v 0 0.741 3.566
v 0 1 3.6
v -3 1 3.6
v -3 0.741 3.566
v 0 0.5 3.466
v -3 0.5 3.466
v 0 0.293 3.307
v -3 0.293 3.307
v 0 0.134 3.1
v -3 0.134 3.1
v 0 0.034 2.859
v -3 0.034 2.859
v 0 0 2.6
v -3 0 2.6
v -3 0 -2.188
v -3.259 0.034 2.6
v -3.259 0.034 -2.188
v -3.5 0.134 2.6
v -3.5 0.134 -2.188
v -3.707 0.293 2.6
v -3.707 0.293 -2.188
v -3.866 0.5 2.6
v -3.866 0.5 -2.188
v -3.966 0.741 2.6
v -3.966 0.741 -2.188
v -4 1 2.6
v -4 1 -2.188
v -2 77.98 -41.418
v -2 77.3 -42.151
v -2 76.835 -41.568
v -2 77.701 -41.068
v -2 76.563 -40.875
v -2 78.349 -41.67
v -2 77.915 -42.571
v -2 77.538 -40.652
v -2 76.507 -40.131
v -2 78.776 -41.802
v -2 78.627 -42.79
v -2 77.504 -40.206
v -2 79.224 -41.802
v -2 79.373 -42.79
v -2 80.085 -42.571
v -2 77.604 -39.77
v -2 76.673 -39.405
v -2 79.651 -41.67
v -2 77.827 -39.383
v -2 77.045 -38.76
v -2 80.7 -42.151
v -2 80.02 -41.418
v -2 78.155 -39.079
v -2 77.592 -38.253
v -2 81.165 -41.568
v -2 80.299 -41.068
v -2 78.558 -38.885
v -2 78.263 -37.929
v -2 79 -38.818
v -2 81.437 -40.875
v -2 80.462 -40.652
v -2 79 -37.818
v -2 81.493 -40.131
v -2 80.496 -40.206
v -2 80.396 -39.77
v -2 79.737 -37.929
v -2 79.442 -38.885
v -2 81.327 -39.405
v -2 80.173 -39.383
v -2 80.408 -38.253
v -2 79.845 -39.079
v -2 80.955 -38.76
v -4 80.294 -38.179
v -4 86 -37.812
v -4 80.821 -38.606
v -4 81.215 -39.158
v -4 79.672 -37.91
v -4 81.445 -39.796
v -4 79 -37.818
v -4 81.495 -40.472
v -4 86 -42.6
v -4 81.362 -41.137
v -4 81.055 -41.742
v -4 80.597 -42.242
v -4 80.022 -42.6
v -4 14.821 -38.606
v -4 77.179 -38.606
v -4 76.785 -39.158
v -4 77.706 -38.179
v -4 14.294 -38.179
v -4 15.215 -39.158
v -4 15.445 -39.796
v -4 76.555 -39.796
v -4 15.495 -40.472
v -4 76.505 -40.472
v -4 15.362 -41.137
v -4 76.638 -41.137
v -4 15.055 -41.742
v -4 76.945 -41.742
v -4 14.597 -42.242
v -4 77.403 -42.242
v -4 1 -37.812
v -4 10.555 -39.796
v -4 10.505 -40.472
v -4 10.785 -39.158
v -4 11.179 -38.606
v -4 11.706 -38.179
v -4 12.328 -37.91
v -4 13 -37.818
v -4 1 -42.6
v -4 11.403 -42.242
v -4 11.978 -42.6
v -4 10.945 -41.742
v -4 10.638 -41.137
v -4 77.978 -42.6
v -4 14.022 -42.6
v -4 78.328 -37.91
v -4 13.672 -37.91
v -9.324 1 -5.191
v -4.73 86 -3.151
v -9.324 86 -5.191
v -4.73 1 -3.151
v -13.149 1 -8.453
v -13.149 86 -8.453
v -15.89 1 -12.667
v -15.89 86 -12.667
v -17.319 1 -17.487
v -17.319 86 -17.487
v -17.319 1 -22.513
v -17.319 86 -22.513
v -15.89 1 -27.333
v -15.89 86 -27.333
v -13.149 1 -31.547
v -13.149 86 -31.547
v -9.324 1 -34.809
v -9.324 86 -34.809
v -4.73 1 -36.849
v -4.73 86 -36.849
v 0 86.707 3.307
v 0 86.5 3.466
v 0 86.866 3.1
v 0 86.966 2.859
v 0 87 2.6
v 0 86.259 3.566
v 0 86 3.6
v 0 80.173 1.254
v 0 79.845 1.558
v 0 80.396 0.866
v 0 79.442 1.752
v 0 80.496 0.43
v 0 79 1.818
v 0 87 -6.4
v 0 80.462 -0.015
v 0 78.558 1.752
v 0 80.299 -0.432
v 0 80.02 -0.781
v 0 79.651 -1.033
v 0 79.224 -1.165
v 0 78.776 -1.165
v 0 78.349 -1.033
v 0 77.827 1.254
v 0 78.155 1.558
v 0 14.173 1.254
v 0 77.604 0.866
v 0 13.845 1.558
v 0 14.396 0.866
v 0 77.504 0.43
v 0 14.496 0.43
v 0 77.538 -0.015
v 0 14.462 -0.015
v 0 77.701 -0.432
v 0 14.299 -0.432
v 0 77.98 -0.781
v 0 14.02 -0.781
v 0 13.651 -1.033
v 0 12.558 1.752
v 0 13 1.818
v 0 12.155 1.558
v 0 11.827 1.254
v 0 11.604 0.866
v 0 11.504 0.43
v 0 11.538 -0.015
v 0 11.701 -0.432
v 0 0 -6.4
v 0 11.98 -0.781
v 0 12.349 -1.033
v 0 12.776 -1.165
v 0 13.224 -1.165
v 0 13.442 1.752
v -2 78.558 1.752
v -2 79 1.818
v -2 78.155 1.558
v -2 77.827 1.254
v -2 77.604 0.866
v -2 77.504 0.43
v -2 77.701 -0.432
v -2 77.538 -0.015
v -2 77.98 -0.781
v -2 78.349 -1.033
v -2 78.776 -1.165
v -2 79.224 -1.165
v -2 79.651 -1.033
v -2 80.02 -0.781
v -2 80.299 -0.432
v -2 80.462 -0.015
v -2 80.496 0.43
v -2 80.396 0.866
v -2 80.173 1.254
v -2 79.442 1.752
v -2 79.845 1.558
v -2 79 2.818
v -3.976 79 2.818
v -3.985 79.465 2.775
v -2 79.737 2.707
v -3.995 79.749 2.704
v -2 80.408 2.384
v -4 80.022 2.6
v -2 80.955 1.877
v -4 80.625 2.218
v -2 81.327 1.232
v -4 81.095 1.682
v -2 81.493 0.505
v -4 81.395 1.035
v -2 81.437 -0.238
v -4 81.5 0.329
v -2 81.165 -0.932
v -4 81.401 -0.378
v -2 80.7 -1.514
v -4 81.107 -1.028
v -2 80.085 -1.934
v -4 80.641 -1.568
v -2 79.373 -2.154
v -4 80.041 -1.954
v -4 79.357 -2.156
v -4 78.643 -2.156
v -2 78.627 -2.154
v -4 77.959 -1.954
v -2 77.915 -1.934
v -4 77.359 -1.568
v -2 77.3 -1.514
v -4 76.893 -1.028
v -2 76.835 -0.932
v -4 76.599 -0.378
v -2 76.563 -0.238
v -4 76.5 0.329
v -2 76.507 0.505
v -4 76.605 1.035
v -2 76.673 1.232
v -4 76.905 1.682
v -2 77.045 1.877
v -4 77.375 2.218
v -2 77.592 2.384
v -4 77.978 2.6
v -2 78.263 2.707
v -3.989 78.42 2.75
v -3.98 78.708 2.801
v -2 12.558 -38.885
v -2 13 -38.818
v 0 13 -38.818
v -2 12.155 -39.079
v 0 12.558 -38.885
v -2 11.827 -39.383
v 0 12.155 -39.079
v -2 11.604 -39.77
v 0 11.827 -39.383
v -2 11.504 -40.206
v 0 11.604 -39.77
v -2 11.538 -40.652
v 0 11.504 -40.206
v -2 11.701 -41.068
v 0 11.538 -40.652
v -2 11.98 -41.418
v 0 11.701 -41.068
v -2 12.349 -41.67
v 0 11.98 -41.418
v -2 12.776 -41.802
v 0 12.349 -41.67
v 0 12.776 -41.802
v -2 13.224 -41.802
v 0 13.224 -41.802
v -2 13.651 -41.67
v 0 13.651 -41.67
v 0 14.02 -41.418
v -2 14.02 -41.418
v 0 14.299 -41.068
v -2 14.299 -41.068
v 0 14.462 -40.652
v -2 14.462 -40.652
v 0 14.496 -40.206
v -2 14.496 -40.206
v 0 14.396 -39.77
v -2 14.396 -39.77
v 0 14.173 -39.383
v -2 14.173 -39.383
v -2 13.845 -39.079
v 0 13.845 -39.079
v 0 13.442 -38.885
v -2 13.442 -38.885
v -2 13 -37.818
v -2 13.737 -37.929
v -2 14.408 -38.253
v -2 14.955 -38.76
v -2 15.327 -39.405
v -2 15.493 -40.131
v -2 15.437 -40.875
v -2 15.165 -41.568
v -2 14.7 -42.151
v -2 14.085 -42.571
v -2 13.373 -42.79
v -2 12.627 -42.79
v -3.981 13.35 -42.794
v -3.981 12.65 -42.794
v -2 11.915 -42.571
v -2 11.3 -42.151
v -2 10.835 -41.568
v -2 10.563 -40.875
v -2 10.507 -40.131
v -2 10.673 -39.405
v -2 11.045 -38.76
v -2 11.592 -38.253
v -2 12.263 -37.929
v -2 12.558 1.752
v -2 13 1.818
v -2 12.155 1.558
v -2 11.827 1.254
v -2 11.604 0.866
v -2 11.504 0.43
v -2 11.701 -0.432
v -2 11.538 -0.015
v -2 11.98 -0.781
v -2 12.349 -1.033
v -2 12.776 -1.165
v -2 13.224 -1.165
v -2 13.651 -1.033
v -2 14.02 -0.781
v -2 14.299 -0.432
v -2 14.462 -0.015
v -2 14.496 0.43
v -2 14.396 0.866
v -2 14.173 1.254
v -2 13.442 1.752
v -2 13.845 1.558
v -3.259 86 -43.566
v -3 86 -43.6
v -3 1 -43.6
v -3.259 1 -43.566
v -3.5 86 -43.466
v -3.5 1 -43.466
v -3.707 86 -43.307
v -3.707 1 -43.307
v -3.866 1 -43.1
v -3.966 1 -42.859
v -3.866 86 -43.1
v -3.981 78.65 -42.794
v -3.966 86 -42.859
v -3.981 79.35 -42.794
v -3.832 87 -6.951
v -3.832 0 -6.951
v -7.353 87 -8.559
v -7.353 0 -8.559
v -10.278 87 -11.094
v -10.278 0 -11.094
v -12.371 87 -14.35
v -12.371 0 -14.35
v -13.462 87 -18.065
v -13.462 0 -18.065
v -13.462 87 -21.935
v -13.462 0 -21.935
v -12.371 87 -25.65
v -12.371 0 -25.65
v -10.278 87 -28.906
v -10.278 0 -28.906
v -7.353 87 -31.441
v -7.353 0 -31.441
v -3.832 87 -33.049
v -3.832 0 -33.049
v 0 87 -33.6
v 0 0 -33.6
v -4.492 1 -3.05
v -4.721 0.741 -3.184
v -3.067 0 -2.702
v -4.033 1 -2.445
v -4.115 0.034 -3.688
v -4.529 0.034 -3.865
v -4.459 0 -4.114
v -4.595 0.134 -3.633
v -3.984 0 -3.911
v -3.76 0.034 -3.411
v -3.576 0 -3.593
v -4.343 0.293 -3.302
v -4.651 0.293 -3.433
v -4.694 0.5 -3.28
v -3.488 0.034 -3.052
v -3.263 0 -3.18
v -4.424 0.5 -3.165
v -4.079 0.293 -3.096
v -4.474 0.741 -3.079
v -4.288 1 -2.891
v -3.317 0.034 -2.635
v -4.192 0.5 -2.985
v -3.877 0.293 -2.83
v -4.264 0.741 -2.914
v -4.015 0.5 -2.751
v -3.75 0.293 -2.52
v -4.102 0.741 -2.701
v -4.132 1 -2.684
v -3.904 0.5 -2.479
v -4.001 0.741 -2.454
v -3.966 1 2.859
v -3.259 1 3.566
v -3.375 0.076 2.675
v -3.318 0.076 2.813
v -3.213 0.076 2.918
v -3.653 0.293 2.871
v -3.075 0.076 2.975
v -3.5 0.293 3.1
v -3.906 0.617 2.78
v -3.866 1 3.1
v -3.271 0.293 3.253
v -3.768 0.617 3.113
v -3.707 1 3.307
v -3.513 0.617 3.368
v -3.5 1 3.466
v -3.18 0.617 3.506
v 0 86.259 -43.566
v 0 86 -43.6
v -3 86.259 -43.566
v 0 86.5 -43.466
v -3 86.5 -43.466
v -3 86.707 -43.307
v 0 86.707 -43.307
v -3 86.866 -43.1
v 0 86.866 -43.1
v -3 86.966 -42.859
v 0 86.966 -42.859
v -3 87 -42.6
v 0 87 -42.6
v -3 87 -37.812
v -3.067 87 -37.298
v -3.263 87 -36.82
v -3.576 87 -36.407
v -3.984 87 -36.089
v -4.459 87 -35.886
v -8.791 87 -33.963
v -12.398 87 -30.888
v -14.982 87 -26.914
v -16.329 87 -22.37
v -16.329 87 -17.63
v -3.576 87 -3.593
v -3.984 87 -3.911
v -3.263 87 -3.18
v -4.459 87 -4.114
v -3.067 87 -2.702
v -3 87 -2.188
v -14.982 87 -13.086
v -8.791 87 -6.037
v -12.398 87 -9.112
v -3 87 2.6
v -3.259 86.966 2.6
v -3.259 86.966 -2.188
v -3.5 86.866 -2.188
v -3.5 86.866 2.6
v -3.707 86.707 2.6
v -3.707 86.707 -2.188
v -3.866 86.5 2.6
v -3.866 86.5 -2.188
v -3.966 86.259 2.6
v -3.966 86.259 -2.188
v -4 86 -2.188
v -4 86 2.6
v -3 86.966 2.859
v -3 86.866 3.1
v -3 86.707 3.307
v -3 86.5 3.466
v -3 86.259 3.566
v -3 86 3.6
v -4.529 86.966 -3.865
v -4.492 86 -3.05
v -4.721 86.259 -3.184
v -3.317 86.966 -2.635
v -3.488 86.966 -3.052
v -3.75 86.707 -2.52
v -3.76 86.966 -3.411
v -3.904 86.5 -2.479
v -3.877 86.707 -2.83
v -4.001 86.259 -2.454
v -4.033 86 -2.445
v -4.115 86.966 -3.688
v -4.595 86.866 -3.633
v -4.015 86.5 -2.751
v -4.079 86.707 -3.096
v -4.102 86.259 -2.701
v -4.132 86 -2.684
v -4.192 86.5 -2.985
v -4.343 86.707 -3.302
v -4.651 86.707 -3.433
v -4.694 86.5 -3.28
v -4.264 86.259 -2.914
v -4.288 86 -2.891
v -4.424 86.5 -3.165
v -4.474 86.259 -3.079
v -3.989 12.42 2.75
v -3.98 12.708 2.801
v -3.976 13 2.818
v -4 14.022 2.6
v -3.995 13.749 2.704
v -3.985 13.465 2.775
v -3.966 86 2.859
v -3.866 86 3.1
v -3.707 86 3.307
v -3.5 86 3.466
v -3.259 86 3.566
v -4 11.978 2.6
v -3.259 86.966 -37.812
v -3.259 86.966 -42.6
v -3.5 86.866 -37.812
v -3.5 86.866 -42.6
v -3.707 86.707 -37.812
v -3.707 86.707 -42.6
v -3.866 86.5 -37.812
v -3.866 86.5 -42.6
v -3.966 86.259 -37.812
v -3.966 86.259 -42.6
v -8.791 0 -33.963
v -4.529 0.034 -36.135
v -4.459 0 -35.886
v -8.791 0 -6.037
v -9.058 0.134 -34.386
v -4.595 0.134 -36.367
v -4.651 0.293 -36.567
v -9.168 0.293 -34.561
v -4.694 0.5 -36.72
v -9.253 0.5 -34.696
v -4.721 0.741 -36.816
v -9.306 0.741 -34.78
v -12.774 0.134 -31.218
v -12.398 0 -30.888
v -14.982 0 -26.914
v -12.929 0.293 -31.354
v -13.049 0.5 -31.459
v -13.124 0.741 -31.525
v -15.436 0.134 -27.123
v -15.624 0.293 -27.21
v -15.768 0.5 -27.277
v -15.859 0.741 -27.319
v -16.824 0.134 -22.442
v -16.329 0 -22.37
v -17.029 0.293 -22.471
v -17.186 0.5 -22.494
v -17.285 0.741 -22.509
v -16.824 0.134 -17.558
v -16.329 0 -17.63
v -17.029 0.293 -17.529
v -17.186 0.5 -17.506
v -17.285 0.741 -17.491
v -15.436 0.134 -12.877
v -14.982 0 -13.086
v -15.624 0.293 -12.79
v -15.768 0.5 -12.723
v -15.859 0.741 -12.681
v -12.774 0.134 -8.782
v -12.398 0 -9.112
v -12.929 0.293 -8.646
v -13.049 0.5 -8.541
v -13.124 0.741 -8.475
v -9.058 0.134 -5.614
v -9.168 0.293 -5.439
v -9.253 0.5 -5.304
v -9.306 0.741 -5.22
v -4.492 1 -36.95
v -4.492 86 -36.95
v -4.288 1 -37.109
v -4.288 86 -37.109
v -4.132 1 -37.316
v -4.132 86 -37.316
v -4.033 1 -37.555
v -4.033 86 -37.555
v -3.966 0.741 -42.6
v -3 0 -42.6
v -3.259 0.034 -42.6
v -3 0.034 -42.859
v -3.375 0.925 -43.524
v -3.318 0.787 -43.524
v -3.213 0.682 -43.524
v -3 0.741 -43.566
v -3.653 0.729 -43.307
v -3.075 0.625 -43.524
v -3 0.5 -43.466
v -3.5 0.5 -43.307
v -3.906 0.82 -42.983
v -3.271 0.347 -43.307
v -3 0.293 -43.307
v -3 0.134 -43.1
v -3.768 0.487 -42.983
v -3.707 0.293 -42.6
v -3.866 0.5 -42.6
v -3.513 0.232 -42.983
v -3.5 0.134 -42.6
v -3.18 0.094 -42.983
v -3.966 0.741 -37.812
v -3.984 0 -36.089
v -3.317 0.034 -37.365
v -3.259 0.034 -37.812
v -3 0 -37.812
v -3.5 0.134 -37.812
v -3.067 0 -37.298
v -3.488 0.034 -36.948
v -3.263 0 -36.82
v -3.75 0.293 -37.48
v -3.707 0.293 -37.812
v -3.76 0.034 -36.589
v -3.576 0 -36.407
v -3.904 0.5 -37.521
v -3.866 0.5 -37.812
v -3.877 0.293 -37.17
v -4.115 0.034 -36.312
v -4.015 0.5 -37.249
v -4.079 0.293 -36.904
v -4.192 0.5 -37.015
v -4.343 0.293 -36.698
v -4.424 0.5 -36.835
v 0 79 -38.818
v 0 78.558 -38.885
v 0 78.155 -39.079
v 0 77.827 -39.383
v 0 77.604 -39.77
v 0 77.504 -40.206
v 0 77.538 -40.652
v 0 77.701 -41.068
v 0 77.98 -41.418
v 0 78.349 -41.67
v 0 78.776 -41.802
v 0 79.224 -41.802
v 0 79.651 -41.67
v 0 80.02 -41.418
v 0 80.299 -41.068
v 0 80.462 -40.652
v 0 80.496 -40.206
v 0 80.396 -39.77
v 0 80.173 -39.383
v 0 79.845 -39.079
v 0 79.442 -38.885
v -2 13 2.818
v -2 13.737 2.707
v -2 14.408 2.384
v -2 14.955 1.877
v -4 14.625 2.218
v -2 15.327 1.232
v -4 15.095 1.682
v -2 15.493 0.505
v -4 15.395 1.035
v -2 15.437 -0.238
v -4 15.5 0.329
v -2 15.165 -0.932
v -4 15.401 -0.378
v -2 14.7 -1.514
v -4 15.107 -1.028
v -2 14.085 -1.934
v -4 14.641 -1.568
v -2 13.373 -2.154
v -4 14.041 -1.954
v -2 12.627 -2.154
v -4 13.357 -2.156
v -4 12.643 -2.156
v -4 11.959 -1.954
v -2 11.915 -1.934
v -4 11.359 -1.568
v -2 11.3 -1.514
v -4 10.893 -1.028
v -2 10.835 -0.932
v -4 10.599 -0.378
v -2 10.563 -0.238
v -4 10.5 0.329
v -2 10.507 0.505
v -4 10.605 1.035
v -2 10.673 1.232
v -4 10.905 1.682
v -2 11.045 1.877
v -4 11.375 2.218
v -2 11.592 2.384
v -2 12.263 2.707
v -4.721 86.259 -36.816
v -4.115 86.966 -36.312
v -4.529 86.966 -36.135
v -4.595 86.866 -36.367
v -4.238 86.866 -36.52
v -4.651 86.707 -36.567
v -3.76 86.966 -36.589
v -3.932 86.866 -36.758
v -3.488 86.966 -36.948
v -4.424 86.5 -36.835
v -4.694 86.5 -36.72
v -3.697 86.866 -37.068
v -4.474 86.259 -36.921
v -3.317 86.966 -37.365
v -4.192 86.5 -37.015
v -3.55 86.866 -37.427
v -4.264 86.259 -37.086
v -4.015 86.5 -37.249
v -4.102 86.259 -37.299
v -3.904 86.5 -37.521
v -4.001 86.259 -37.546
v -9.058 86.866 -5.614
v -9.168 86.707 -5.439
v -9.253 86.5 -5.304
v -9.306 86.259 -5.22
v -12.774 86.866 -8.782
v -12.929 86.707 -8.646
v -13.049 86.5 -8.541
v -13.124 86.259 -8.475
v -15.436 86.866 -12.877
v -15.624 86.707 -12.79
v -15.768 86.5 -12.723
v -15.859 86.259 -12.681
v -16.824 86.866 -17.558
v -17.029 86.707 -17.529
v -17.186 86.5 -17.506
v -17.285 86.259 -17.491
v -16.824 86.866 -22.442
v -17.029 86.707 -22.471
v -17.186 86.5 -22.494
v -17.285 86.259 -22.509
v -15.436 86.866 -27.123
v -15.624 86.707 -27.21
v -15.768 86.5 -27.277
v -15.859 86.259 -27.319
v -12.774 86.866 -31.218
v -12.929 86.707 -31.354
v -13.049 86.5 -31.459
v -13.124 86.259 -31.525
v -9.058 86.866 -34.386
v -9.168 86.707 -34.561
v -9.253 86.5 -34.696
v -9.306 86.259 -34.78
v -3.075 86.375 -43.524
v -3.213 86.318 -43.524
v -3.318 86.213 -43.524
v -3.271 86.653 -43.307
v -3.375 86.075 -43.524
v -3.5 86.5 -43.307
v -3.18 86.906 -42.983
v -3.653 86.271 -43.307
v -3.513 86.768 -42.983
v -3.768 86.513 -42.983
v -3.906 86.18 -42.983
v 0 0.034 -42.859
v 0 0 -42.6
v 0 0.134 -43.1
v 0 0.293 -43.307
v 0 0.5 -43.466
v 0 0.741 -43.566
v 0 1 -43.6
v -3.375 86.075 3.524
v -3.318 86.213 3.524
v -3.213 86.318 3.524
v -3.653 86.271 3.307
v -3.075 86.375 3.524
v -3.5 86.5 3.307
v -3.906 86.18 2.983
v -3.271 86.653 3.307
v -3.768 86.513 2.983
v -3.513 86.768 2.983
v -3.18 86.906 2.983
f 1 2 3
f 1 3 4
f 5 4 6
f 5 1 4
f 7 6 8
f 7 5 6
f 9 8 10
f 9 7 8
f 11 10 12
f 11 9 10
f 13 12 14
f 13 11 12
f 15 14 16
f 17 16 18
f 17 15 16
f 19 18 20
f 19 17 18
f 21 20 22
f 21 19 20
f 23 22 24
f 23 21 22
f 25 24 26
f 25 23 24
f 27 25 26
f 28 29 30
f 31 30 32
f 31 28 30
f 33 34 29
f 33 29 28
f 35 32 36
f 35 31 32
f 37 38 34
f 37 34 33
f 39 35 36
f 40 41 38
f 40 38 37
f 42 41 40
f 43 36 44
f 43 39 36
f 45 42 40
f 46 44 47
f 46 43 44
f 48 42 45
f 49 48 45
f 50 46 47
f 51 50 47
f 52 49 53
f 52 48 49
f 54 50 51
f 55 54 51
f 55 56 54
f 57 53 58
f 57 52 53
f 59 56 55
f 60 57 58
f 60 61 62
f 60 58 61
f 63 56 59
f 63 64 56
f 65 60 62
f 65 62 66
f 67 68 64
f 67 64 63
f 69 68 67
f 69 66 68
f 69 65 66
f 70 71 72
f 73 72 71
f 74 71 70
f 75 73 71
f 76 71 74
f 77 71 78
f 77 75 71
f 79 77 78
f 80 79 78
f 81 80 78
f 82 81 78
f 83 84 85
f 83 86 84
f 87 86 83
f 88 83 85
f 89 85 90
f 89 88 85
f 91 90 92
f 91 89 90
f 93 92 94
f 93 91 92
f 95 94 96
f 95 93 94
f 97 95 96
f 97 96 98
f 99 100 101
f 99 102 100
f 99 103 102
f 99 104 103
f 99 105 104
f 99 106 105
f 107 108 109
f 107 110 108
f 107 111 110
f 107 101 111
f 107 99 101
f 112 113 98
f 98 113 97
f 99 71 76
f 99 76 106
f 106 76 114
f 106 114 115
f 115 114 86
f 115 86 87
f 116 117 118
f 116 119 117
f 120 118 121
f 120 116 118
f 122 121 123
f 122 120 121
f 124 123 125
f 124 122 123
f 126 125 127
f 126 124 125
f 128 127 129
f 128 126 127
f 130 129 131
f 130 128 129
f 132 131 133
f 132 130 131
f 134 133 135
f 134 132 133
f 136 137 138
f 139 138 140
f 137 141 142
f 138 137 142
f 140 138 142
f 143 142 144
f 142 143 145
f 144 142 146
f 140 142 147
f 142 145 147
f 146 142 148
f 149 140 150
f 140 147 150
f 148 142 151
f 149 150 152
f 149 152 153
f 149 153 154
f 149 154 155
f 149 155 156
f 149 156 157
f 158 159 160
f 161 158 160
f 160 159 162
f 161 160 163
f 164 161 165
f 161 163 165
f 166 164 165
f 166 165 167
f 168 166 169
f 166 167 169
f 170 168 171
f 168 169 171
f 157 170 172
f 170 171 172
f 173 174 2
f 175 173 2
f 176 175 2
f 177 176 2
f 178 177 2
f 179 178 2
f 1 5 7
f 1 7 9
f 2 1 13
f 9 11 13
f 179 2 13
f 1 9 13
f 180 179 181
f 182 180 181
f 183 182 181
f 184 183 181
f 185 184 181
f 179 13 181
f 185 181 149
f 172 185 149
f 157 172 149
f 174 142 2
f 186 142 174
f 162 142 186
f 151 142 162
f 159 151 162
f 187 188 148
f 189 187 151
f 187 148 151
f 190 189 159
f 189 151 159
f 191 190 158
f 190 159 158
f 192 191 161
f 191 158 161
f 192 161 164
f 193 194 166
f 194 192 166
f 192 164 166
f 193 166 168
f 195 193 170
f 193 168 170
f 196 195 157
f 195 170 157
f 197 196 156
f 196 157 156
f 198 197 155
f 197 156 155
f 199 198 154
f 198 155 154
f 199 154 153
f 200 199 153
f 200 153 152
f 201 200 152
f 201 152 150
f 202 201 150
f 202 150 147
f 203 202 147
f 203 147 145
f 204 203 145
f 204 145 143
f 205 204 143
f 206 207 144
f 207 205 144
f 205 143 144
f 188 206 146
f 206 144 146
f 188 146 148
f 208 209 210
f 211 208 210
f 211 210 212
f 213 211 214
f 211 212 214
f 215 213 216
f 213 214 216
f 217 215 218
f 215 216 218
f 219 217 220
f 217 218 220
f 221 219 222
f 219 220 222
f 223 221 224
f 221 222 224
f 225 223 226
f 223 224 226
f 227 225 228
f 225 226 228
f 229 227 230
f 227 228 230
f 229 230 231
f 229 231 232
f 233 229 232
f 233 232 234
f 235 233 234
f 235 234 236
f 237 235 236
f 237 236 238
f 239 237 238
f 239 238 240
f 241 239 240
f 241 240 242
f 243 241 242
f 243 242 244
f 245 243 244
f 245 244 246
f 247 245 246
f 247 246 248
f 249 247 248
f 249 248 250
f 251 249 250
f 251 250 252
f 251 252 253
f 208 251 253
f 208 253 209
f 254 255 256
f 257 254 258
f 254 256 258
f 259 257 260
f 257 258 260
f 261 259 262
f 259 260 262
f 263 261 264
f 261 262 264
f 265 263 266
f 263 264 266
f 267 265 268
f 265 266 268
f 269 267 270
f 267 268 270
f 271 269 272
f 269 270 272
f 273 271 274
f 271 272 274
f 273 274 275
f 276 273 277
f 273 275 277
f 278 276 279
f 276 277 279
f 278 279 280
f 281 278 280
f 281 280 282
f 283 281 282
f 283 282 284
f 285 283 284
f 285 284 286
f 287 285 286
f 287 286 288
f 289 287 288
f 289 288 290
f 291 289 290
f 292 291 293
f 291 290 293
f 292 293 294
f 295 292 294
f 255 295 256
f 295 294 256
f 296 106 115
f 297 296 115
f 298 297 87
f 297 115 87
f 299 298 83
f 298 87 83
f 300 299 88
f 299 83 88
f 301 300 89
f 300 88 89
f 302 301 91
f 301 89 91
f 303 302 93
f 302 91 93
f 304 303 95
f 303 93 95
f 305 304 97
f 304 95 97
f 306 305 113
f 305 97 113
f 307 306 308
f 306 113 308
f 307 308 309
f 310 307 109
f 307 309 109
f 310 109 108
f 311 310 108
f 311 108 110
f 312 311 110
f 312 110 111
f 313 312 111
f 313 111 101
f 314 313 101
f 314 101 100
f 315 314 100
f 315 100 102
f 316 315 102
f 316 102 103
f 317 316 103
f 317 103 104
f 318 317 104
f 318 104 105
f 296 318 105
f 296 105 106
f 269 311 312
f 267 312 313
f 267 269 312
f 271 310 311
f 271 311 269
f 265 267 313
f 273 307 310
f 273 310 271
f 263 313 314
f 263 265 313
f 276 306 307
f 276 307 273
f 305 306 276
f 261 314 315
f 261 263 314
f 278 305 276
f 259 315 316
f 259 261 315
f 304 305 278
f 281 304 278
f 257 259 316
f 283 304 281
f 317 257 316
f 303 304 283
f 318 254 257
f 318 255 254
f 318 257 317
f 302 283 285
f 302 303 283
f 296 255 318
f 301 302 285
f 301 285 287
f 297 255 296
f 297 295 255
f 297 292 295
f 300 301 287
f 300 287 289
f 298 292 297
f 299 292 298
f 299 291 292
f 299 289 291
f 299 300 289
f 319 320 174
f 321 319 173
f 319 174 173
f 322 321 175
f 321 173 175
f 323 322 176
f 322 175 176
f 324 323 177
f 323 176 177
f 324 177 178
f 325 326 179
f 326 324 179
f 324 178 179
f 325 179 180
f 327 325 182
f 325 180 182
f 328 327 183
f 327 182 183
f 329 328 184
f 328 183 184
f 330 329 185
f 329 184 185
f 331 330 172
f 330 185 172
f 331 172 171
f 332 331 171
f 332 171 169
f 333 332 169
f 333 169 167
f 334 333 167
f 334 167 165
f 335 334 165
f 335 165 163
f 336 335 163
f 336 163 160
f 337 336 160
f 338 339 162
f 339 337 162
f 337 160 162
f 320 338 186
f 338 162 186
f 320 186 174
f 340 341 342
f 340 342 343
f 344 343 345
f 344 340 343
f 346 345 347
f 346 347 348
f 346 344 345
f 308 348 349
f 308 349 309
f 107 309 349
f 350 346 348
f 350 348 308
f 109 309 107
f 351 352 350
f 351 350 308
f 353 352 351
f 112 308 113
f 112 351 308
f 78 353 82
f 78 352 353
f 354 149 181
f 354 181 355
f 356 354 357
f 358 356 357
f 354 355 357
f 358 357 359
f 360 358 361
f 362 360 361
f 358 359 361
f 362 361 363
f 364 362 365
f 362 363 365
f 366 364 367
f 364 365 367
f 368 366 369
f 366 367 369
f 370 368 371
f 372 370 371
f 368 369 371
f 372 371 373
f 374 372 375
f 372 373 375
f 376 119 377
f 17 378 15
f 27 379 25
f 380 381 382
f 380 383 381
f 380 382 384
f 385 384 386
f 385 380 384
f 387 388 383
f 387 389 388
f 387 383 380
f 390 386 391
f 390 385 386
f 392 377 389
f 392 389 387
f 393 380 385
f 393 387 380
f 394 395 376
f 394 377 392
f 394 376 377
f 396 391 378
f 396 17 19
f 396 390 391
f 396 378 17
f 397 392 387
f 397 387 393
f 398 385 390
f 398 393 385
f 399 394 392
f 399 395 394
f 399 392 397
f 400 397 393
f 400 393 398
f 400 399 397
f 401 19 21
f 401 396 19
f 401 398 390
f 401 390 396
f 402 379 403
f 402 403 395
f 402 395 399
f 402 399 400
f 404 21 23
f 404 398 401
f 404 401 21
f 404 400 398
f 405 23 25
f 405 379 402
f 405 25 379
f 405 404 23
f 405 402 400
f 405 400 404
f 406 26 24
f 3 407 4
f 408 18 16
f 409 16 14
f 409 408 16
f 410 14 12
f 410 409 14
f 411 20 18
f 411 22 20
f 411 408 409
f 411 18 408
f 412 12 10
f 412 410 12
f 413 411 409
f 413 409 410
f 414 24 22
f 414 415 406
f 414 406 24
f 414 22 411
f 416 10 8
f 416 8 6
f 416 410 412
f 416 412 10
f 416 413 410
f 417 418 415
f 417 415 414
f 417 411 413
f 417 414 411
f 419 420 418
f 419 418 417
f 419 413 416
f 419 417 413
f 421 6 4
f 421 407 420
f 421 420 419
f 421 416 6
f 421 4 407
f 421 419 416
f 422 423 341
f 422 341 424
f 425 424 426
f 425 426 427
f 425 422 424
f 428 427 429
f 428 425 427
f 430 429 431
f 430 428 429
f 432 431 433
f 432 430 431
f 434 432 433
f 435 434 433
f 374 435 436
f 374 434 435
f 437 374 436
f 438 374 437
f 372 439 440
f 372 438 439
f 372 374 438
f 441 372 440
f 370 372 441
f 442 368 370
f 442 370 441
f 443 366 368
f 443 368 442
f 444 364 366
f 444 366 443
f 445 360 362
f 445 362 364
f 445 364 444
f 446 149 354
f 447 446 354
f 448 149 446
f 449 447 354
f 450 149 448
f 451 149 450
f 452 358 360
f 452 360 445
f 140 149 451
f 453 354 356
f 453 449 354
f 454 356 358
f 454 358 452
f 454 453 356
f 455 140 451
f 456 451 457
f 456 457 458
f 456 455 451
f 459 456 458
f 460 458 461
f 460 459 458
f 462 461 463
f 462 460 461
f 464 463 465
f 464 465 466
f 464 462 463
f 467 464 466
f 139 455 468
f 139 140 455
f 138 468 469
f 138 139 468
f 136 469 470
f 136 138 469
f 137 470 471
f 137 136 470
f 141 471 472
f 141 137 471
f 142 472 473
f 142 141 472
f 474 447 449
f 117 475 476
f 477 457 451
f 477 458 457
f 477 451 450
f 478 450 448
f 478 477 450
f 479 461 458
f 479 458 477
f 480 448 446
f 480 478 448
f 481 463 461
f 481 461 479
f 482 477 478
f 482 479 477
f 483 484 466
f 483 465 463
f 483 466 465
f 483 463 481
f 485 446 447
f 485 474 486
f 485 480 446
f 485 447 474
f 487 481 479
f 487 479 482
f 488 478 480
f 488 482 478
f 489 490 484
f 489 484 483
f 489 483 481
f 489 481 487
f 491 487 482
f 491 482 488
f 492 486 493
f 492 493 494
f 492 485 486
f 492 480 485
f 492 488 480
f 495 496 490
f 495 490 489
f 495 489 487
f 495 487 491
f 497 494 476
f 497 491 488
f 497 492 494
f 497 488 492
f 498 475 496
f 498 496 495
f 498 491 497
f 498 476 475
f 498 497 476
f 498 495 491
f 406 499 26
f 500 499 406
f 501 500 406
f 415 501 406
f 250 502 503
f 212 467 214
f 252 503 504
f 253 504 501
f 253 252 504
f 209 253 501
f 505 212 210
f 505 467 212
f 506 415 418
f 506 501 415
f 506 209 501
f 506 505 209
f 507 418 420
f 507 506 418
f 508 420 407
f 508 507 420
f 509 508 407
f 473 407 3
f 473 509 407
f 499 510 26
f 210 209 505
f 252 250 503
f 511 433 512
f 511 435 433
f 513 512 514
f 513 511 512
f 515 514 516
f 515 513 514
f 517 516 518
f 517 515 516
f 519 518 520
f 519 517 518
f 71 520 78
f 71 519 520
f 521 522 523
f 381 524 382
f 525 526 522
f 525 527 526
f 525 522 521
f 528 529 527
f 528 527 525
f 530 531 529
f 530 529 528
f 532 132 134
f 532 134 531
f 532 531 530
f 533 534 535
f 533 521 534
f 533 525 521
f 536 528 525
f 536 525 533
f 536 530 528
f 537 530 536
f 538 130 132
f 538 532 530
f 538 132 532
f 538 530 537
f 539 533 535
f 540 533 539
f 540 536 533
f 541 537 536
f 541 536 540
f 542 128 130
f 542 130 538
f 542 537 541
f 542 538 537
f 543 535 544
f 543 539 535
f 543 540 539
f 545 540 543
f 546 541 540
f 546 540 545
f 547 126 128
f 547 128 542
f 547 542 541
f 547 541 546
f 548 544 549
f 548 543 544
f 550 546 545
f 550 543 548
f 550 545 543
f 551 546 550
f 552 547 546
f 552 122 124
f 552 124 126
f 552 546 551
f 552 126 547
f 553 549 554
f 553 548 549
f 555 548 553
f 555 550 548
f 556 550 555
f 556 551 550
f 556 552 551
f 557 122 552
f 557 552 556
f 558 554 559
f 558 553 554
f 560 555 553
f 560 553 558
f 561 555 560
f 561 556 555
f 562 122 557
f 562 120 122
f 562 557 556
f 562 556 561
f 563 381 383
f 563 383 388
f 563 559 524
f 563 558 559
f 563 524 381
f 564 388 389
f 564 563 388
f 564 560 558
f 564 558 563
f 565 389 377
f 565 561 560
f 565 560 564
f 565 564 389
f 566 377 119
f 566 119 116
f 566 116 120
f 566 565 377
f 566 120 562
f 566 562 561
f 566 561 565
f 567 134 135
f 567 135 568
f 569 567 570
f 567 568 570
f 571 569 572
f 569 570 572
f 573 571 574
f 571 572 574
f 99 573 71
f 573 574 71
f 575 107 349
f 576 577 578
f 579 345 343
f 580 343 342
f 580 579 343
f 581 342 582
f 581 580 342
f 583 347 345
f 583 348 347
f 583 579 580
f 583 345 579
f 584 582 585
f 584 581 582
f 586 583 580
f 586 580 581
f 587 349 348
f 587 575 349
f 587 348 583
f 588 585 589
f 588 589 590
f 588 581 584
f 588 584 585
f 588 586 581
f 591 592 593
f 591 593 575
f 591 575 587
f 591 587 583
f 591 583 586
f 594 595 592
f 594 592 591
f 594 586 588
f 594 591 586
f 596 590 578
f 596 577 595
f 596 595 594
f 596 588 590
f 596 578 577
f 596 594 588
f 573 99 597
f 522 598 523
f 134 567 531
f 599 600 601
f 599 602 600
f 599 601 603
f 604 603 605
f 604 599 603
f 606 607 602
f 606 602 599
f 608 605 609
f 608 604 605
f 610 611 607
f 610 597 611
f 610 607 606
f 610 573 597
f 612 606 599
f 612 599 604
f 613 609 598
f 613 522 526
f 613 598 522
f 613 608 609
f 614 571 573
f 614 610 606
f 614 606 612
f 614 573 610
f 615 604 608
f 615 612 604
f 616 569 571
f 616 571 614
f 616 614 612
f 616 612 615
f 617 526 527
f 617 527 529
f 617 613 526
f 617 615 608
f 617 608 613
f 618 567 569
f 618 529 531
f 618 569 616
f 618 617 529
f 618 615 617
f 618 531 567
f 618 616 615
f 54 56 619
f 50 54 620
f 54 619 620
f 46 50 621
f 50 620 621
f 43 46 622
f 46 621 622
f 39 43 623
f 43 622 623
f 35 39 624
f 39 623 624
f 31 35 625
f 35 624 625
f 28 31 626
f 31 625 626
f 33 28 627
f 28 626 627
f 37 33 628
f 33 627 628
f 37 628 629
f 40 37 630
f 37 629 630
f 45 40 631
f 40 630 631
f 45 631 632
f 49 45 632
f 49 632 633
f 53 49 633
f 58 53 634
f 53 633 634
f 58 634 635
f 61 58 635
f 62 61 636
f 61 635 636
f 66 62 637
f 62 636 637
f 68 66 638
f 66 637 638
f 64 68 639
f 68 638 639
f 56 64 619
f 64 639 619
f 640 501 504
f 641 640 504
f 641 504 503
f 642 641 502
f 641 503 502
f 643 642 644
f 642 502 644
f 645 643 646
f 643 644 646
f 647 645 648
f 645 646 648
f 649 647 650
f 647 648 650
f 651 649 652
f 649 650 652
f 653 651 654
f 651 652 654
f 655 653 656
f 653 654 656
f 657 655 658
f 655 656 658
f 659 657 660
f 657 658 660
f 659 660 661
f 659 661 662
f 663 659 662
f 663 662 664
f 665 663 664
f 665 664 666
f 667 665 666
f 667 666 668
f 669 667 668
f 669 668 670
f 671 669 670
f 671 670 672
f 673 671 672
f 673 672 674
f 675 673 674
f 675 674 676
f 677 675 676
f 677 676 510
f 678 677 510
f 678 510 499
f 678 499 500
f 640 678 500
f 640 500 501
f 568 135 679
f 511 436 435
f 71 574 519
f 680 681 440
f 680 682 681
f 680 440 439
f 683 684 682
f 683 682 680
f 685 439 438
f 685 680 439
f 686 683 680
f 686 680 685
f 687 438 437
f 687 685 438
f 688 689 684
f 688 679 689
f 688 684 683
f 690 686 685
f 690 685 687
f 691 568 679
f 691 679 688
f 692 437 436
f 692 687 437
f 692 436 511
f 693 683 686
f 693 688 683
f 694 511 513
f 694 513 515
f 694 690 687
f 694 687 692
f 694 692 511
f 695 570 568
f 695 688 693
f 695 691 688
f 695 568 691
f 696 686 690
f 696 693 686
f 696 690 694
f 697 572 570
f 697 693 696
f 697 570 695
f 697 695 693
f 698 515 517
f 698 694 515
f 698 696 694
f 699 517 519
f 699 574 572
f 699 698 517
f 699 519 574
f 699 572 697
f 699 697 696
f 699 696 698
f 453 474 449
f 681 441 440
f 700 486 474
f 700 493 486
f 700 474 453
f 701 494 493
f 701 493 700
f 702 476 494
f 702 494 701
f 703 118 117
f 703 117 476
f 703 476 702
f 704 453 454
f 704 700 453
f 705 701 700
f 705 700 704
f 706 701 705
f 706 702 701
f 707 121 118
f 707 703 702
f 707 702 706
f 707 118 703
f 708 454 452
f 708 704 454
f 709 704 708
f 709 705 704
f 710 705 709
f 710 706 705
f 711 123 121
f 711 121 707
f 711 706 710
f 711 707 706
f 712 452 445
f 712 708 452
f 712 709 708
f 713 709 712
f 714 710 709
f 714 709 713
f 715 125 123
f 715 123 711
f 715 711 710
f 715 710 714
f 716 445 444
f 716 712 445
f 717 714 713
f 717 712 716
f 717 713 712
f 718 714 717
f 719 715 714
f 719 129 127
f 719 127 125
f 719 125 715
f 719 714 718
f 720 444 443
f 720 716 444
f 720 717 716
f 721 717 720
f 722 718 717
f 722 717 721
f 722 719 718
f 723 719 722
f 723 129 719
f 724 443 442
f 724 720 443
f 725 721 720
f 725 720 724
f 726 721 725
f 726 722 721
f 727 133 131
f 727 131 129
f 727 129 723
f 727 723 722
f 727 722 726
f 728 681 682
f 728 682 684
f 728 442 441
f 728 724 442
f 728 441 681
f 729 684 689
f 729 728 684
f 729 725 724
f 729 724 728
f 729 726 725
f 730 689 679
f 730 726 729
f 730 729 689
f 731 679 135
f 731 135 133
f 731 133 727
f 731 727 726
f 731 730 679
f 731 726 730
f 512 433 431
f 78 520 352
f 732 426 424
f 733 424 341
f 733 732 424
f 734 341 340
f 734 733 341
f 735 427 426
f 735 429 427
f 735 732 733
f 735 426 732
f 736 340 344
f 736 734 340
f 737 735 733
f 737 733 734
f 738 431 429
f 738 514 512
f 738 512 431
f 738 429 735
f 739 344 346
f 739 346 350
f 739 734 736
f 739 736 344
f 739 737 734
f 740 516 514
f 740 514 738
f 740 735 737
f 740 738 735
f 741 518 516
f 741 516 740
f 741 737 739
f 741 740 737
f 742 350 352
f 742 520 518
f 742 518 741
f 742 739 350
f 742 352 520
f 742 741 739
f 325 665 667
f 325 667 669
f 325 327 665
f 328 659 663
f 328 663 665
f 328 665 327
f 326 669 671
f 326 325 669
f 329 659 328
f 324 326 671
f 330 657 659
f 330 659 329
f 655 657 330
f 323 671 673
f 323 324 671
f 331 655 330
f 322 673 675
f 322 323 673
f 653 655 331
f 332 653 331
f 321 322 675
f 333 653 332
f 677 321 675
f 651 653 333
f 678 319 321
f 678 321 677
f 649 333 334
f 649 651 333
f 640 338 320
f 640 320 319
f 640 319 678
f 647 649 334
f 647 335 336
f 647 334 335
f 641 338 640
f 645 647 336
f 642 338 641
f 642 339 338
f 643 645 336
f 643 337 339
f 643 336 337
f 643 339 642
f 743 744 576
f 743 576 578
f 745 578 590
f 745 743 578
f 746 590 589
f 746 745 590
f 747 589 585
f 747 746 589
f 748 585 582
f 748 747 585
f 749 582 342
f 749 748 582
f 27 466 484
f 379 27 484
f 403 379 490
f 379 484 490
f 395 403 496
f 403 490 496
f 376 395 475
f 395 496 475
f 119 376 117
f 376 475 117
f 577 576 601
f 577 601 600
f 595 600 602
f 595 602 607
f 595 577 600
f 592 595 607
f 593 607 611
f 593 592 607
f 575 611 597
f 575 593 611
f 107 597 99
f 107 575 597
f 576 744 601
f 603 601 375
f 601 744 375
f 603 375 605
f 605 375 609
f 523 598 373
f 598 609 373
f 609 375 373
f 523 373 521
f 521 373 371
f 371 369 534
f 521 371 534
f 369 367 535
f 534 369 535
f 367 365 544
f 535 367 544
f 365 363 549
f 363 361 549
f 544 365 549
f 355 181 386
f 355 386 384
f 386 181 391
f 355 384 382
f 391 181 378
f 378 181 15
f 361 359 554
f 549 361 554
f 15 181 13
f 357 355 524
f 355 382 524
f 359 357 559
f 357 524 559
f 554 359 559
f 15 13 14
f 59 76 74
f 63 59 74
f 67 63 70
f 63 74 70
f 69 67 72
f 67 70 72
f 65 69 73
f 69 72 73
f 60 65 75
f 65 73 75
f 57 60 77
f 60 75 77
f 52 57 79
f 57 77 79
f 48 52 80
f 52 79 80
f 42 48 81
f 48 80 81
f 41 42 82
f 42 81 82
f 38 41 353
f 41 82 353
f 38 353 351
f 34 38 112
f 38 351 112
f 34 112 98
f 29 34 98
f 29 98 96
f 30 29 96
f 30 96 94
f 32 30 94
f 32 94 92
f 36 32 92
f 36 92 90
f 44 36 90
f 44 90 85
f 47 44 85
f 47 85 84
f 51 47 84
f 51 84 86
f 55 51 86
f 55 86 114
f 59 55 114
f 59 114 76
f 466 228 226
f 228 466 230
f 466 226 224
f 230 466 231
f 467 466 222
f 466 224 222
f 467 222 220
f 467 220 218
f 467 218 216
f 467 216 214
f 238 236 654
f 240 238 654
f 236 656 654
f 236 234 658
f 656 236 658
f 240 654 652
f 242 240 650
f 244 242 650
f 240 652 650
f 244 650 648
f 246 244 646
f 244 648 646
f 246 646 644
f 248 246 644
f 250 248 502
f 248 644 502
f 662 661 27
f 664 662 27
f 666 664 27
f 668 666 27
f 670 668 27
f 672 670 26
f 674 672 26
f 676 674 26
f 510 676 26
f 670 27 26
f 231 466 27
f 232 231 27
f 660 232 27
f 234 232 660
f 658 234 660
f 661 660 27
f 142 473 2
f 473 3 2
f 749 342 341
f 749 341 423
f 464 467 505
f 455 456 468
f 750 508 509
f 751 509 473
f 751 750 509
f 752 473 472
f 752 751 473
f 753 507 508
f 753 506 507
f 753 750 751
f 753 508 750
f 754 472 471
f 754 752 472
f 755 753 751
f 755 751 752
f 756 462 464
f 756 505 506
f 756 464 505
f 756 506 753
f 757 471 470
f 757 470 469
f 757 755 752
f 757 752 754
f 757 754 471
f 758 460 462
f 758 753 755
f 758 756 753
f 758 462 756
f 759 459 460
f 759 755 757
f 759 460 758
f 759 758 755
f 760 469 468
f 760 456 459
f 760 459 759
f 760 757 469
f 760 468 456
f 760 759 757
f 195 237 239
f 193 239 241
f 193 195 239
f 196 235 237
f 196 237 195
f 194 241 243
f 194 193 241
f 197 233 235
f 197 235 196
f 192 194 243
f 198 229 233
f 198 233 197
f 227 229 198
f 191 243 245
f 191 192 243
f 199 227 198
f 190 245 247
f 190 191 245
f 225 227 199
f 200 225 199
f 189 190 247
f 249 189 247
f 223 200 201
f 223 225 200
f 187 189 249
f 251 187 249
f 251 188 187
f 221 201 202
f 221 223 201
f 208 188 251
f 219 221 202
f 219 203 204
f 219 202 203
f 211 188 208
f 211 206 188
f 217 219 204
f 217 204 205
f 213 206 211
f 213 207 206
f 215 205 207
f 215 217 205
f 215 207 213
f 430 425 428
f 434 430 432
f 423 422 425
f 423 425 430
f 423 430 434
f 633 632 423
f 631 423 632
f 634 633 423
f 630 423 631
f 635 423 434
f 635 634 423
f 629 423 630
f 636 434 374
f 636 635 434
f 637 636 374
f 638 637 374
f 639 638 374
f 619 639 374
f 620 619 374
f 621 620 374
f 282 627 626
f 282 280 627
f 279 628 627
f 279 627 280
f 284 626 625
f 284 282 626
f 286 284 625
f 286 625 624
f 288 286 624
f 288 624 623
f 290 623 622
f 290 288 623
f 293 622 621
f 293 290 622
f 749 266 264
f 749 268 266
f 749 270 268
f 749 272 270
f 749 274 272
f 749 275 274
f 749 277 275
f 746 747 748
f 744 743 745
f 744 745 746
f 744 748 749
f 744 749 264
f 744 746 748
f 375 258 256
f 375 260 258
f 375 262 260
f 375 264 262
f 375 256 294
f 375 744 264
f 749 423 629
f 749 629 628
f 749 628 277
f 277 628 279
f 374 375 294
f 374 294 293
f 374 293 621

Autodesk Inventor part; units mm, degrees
ref_plane "YZ Plane" through (0, 0, 0) normal (1, 0, 0) x (0, 1, 0)
ref_plane "XZ Plane" through (0, 0, 0) normal (0, 1, 0) x (-1, 0, 0)
ref_plane "XY Plane" through (0, 0, 0) normal (0, 0, 1) x (1, 0, 0)
sketch "スケッチ1" plane through (0, 0, 0) normal (0, 1, 0) x (-1, 0, 0)
  line L0 (0, 0) -> (20, 0)
  line L1 (20, 0) -> (20, -40)
  line L2 (20, -40) -> (0, -40)
  line L3 (0, -40) -> (0, 0)
  circle A0 centre (0, -20) radius 13.6
  circle A1 centre (0, -20) radius 17.5
  line L4 (0, -6.4) -> (4, -6.4)
  line L5 (4, -6.4) -> (4, 3.6)
  line L6 (4, 3.6) -> (0, 3.6)
  line L7 (0, 3.6) -> (0, -6.4)
  line L8 (0, -33.6) -> (4, -33.6)
  line L9 (4, -33.6) -> (4, -43.6)
  line L10 (4, -43.6) -> (0, -43.6)
  line L11 (0, -43.6) -> (0, -33.6)
  point P0 (0, -6.4)
  point P1 (0, -33.6)
  point P2 (4, -37.0367)
  point P3 (4, -2.9633)
  dimension "d0" = 20
  dimension "d1" = 40
  dimension "d2" = 27.2
  dimension "d3" = 35
  dimension "d4" = 4
  dimension "d5" = 10
  dimension "d6" = 4
  dimension "d7" = 10
extrude "押し出し1" add sketch "スケッチ1" along normal blind 87 contours L7 L6 L5 L0 | L0 L5 A1 L3 | A1 L5 L4 L3 | A1 L9 L8 A0 L4 L5 | A1 L9 L2 L3 | L3 L8 L9 A1 | L2 L9 L10 L11
sketch "スケッチ2" plane through (-4, 0, -43.6) normal (-1, 0, 0) x (0, 0, 1)
  line L0 (0, 87) -> (6.5633, 87) projected
  line L1 (40.6367, 87) -> (47.2, 87) projected
  line L2 (40.6367, 0) -> (47.2, 0) projected
  line L3 (0, 0) -> (6.5633, 0) projected
  point P0 (43.6, 0)
  point P1 (3.2816, 13)
  point P2 (3.2816, 79)
  point P3 (43.9184, 79)
  point P4 (43.9184, 13)
  point P5 (3.2816, 87)
  point P6 (43.9184, 87)
  point P7 (43.9184, 0)
  point P8 (3.2816, 0)
  dimension "d10" = 0
  dimension "d11" = 8
  dimension "d12" = 0
  dimension "d13" = 8
  dimension "d14" = 0
  dimension "d15" = 0
  dimension "d16" = 13
  dimension "d17" = 13
hole "穴1" at (-4, 13, -40.3184) at (-4, 79, -40.3184) at (-4, 79, 0.3184) at (-4, 13, 0.3184) direction (1, 0, 0) diameter 3 end through all
fillet "フィレット1" radius 1 14 edges at (-4, 87, 0.3184) (-17.5, 87, -20) (-4, 87, -40.3184) (-2, 87, -43.6) (-2, 87, 3.6) (-4, 43.5, 3.6) (-4, 0, 0.3184) (-17.5, 0, -20) (-4, 0, -40.3184) (-2, 0, -43.6) (-2, 0, 3.6) (-4, 43.5, -43.6) (-4, 43.5, -37.0367) (-4, 43.5, -2.9633)
sketch "スケッチ5" plane through (-4, 1, -37.8115) normal (-1, 0, 0) x (0, 0, 1)
  circle A0 centre (-2.5068, 12) radius 1.5 projected
  circle A1 centre (-2.5068, 12) radius 2.5
  circle A2 centre (38.1299, 12) radius 1.5 projected
  circle A3 centre (38.1299, 12) radius 2.5
  circle A4 centre (-2.5068, 78) radius 1.5 projected
  circle A5 centre (-2.5068, 78) radius 2.5
  circle A6 centre (38.1299, 78) radius 1.5 projected
  circle A7 centre (38.1299, 78) radius 2.5
  point P0 (37.8115, -1)
  dimension "d36" = 5
  dimension "d37" = 5
  dimension "d38" = 5
  dimension "d39" = 5
extrude "押し出し4" cut sketch "スケッチ5" against normal blind 2
properties part number "arm-2-2_3D プリント"
